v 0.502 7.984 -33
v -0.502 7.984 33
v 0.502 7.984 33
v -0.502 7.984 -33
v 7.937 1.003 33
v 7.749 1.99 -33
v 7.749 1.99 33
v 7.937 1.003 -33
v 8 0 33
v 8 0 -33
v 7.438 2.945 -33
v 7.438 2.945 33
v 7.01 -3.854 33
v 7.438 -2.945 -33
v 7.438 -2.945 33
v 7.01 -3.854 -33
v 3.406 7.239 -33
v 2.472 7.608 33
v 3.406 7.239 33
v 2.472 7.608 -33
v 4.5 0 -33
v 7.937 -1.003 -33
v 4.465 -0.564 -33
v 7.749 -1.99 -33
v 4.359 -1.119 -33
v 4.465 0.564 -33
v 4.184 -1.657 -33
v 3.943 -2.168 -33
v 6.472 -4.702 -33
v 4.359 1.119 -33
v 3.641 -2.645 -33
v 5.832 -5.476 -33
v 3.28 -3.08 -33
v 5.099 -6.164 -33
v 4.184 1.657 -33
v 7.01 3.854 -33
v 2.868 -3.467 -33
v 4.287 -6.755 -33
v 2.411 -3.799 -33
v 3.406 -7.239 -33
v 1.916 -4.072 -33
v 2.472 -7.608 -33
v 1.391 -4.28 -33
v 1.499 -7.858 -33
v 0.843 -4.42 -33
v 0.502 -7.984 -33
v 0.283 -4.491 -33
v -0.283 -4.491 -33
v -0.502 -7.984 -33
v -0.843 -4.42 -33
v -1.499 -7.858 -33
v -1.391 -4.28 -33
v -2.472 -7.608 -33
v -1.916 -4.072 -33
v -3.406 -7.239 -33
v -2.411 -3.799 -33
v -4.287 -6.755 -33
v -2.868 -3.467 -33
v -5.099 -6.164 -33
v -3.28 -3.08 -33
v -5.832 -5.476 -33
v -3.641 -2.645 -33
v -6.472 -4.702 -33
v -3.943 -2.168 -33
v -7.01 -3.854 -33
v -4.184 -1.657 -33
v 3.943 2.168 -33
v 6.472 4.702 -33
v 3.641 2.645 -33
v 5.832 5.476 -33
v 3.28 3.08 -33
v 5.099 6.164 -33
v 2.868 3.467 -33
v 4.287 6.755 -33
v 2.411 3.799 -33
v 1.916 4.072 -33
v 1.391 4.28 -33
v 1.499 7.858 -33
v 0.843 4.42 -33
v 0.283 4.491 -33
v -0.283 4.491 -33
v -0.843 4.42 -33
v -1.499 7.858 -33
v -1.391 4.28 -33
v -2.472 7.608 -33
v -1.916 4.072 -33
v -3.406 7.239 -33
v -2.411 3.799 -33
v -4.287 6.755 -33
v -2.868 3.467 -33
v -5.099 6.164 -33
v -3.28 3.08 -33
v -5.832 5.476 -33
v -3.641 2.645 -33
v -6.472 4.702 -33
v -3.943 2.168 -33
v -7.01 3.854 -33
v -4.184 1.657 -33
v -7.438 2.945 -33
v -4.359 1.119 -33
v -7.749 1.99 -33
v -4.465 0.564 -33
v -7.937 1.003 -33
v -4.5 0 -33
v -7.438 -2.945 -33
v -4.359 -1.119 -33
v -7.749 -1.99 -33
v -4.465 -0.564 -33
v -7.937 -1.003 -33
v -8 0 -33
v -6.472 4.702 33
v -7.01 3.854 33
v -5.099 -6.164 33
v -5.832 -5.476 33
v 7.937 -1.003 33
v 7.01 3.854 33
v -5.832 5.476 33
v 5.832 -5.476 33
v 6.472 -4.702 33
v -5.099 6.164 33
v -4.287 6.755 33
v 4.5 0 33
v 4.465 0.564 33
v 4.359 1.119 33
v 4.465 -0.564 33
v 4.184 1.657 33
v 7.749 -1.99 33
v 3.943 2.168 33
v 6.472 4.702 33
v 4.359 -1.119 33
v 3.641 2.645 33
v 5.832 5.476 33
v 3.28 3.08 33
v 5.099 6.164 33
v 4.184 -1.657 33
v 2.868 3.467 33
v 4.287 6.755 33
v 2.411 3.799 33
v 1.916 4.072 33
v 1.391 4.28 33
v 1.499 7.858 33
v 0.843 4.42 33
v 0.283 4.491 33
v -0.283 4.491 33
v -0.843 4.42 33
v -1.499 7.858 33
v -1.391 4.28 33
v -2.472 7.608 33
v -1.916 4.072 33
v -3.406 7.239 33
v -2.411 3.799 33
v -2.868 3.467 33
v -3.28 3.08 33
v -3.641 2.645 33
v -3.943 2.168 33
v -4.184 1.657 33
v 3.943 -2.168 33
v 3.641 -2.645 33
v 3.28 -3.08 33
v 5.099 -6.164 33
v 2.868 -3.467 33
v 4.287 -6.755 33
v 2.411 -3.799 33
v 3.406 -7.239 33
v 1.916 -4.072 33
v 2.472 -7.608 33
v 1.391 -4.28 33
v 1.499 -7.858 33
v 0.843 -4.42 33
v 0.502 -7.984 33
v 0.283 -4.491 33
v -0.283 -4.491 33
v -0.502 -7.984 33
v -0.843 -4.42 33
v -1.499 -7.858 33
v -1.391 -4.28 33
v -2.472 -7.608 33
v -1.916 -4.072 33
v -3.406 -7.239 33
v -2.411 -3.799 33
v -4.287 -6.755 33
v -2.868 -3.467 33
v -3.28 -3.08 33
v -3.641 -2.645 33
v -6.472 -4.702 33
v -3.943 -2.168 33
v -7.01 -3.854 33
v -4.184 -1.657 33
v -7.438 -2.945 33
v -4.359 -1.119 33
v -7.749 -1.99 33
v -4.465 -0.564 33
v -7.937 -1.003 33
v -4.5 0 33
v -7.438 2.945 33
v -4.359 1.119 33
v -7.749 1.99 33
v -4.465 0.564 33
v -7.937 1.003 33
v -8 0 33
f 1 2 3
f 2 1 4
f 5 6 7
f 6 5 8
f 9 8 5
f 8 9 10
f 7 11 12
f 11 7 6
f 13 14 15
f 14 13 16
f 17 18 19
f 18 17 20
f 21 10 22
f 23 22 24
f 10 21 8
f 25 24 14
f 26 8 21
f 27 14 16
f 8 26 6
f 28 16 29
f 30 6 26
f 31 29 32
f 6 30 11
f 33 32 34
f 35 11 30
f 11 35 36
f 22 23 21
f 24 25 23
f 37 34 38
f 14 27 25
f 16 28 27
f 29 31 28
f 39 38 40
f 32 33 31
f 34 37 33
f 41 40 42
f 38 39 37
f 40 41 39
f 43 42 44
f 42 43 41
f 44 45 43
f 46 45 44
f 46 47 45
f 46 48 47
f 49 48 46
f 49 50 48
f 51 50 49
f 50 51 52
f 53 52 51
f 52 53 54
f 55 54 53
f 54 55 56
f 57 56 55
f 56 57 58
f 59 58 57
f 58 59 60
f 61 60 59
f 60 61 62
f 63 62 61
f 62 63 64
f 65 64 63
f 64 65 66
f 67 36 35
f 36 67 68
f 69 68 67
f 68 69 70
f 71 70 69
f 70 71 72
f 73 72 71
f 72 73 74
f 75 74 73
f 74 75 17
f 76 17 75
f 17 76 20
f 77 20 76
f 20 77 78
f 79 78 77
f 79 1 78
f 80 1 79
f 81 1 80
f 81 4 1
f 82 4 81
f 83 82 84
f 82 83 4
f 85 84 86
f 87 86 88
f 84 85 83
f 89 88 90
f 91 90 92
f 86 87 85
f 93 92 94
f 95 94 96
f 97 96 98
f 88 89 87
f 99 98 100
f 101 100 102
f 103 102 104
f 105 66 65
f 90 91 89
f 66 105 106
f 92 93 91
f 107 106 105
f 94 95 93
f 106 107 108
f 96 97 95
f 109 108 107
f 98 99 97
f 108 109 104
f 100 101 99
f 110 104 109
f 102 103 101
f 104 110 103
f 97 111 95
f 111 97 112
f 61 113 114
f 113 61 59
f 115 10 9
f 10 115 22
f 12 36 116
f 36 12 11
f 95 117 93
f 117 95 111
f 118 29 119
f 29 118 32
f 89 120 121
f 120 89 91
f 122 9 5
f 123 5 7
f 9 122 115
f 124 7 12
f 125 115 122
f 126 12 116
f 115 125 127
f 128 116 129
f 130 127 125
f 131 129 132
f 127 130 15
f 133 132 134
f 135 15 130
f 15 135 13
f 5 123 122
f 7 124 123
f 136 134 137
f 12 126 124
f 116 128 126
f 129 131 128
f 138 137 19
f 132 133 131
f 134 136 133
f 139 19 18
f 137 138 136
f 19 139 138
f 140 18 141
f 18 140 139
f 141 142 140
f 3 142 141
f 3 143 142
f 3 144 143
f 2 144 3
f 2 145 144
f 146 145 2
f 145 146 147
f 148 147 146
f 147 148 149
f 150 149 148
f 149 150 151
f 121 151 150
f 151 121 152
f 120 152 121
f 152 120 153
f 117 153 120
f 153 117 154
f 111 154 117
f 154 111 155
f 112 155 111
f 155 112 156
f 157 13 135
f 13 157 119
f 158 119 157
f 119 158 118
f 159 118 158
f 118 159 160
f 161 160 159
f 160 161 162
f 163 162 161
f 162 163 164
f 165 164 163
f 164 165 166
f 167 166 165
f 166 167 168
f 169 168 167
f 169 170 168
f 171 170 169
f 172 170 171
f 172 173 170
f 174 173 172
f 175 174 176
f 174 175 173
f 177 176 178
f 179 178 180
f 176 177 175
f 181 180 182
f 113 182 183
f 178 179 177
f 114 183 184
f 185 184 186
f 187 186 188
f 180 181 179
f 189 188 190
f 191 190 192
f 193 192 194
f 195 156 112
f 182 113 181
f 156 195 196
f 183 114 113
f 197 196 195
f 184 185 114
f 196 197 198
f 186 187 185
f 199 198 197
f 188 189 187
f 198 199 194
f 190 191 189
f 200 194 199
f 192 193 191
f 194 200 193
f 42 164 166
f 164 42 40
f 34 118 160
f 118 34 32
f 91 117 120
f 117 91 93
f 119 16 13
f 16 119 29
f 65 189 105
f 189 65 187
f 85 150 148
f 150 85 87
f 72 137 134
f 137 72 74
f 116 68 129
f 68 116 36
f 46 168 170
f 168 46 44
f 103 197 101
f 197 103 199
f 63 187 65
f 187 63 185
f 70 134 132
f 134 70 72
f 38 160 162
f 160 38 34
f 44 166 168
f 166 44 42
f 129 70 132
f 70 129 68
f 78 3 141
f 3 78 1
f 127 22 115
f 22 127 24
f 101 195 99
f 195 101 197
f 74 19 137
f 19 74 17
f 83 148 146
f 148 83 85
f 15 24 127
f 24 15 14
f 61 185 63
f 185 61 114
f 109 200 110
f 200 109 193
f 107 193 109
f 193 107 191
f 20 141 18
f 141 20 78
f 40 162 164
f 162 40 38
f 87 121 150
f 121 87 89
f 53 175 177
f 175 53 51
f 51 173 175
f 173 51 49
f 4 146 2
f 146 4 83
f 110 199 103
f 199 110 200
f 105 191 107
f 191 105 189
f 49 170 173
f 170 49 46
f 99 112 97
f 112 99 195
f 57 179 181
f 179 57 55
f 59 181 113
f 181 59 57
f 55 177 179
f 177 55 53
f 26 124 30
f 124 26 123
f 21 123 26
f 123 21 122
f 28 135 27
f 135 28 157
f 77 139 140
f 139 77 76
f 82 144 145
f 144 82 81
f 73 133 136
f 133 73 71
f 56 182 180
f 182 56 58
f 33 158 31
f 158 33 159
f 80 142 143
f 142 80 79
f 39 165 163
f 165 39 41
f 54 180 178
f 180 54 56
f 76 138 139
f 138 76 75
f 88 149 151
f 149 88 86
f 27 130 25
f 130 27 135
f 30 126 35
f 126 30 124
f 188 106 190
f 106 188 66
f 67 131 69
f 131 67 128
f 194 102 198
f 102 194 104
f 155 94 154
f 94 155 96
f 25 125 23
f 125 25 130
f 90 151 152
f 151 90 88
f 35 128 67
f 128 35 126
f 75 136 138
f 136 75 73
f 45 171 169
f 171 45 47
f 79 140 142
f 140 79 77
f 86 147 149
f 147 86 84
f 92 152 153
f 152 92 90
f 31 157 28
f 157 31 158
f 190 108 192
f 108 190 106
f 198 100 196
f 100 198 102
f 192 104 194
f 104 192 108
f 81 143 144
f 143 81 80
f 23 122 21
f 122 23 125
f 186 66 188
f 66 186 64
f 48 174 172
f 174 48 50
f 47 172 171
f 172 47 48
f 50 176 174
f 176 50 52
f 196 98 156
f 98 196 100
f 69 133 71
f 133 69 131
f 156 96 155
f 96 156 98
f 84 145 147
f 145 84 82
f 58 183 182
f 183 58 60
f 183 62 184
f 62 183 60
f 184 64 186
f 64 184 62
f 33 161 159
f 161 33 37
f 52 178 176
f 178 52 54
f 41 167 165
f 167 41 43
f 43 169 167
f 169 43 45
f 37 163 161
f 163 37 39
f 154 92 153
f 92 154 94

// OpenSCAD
$fn = 50;


difference() {
	union() {
		translate(v = [0, 0, -33.0000000000]) {
			cylinder(h = 66, r = 8.0000000000);
		}
	}
	union() {
		translate(v = [0, 0, -100.0000000000]) {
			cylinder(h = 200, r = 4.5000000000);
		}
	}
}
